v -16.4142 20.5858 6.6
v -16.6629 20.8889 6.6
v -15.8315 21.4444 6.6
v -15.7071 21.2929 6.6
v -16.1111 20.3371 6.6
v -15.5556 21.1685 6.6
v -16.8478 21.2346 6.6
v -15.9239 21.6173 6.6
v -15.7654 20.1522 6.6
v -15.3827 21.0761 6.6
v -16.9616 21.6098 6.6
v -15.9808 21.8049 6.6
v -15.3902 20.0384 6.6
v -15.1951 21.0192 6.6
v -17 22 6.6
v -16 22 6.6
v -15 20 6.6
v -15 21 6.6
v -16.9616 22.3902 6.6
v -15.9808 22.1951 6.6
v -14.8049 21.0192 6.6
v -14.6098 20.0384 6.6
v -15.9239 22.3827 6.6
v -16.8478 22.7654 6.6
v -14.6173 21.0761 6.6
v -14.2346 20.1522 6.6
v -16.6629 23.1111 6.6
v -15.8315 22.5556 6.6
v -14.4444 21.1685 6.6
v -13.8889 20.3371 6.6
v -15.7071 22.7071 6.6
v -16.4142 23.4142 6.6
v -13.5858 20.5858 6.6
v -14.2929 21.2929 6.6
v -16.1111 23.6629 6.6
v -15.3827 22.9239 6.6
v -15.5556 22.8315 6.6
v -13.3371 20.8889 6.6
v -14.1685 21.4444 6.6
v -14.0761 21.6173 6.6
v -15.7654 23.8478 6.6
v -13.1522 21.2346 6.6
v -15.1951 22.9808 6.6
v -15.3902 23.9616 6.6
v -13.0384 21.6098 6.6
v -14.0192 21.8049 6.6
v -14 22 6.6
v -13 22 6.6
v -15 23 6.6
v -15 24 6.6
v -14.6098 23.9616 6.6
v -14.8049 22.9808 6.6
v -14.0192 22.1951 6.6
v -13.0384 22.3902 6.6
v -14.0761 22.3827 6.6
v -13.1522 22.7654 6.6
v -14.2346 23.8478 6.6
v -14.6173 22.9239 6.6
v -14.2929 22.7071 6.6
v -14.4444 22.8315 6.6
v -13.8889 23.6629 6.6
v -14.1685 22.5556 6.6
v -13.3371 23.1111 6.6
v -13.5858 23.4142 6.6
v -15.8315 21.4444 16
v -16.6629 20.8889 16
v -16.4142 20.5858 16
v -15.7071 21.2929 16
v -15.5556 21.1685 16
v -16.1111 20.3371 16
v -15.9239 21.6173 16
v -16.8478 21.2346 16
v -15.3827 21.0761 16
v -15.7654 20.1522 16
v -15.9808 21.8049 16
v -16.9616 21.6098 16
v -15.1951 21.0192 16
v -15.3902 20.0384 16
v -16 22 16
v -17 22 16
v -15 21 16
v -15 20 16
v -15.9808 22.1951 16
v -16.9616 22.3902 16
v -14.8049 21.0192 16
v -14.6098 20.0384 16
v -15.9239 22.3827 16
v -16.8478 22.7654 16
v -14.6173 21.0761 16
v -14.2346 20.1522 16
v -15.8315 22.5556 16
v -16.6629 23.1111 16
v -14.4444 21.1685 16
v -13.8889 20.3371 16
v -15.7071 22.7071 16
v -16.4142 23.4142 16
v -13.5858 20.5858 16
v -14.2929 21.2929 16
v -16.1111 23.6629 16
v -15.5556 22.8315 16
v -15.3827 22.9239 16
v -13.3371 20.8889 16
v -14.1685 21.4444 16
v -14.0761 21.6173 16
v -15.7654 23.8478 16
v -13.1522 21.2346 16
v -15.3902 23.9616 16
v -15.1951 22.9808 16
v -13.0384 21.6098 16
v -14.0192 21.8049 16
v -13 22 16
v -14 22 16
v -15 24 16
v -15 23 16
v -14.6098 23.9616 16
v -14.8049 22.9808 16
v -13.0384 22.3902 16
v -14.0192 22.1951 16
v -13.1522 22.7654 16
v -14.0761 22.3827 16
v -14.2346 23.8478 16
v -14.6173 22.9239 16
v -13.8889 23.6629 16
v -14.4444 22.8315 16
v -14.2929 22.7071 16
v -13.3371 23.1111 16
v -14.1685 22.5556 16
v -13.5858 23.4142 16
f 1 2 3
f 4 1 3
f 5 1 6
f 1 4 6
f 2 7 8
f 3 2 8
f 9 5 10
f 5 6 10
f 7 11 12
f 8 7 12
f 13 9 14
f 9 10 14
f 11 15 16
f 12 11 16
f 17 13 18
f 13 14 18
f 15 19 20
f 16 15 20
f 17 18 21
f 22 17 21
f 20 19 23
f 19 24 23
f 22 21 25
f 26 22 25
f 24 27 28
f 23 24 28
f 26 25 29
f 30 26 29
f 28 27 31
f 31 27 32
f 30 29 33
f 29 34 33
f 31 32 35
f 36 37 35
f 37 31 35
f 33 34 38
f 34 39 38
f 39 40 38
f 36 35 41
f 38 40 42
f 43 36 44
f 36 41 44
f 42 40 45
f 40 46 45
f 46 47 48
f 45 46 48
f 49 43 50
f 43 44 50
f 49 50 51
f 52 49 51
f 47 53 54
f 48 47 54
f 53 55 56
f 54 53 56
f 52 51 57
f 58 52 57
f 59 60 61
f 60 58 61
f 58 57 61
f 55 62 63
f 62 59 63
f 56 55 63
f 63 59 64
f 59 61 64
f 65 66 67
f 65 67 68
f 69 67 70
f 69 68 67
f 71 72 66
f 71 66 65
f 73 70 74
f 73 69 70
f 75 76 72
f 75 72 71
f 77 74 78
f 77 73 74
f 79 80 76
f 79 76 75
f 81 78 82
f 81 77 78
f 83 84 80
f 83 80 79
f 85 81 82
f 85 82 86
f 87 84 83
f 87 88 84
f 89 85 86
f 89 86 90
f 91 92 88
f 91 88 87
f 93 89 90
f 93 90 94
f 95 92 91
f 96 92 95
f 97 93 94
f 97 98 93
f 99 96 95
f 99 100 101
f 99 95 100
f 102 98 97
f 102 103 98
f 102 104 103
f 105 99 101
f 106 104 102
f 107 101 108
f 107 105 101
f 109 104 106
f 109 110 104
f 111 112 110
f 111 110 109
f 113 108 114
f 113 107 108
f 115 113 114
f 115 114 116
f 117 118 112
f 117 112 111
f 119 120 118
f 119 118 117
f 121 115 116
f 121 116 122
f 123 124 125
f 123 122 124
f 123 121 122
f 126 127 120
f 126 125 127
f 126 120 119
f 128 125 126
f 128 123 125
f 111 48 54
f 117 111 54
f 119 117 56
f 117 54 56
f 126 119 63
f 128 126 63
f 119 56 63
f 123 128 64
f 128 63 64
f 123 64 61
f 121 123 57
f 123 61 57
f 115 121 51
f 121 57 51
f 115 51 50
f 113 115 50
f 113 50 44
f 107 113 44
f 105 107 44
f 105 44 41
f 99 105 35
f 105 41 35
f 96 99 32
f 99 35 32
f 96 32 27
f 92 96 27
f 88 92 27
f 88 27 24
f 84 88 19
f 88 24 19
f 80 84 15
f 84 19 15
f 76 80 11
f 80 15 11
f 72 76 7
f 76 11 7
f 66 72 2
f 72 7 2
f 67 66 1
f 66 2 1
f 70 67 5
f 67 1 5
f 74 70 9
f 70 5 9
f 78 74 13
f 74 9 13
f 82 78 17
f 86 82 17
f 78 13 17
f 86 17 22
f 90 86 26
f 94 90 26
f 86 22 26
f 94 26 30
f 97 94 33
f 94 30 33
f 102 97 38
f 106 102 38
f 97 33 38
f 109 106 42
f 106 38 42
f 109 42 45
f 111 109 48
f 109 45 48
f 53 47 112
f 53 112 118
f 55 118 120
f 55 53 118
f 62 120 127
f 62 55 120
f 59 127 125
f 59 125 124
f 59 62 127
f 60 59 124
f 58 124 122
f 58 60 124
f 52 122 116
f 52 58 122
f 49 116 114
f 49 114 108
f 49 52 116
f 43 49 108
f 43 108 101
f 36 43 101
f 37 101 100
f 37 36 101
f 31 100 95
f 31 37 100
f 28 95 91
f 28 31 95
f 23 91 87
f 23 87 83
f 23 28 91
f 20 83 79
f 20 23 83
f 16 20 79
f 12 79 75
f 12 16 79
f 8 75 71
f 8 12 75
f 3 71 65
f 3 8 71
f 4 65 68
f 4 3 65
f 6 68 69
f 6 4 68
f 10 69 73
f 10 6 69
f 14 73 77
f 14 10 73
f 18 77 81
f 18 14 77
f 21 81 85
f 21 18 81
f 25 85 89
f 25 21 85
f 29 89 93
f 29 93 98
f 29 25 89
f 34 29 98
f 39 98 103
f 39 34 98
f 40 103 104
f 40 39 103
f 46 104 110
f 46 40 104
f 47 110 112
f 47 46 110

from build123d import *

# Parameters (mm, degrees)
SKETCH316_R      = 1
EXTRUDE183_DEPTH = 9.4
SKETCH317_R      = 2
EXTRUDE184_DEPTH = 9.4


with BuildPart() as extrude183:
    # Sketch316 → Extrude183 (new body)
    with BuildSketch(Plane.XY.offset(6.6)):
        with Locations((36, -22)):
            Circle(SKETCH316_R)
    extrude(amount=EXTRUDE183_DEPTH)


with BuildPart() as cut082:
    # Sketch317 → Extrude184 (new body)
    with BuildSketch(Plane.XY.offset(6.6)):
        with Locations((36, -22)):
            Circle(SKETCH317_R)
    extrude(amount=EXTRUDE184_DEPTH)

    # Cut082: cut Extrude183
    add(extrude183.part, mode=Mode.SUBTRACT)


with BuildPart() as cut082_1:
    # Cut082 placement: moved
    add(cut082.part.moved(Location((-51, 44, 0))))


solid = cut082_1.part
